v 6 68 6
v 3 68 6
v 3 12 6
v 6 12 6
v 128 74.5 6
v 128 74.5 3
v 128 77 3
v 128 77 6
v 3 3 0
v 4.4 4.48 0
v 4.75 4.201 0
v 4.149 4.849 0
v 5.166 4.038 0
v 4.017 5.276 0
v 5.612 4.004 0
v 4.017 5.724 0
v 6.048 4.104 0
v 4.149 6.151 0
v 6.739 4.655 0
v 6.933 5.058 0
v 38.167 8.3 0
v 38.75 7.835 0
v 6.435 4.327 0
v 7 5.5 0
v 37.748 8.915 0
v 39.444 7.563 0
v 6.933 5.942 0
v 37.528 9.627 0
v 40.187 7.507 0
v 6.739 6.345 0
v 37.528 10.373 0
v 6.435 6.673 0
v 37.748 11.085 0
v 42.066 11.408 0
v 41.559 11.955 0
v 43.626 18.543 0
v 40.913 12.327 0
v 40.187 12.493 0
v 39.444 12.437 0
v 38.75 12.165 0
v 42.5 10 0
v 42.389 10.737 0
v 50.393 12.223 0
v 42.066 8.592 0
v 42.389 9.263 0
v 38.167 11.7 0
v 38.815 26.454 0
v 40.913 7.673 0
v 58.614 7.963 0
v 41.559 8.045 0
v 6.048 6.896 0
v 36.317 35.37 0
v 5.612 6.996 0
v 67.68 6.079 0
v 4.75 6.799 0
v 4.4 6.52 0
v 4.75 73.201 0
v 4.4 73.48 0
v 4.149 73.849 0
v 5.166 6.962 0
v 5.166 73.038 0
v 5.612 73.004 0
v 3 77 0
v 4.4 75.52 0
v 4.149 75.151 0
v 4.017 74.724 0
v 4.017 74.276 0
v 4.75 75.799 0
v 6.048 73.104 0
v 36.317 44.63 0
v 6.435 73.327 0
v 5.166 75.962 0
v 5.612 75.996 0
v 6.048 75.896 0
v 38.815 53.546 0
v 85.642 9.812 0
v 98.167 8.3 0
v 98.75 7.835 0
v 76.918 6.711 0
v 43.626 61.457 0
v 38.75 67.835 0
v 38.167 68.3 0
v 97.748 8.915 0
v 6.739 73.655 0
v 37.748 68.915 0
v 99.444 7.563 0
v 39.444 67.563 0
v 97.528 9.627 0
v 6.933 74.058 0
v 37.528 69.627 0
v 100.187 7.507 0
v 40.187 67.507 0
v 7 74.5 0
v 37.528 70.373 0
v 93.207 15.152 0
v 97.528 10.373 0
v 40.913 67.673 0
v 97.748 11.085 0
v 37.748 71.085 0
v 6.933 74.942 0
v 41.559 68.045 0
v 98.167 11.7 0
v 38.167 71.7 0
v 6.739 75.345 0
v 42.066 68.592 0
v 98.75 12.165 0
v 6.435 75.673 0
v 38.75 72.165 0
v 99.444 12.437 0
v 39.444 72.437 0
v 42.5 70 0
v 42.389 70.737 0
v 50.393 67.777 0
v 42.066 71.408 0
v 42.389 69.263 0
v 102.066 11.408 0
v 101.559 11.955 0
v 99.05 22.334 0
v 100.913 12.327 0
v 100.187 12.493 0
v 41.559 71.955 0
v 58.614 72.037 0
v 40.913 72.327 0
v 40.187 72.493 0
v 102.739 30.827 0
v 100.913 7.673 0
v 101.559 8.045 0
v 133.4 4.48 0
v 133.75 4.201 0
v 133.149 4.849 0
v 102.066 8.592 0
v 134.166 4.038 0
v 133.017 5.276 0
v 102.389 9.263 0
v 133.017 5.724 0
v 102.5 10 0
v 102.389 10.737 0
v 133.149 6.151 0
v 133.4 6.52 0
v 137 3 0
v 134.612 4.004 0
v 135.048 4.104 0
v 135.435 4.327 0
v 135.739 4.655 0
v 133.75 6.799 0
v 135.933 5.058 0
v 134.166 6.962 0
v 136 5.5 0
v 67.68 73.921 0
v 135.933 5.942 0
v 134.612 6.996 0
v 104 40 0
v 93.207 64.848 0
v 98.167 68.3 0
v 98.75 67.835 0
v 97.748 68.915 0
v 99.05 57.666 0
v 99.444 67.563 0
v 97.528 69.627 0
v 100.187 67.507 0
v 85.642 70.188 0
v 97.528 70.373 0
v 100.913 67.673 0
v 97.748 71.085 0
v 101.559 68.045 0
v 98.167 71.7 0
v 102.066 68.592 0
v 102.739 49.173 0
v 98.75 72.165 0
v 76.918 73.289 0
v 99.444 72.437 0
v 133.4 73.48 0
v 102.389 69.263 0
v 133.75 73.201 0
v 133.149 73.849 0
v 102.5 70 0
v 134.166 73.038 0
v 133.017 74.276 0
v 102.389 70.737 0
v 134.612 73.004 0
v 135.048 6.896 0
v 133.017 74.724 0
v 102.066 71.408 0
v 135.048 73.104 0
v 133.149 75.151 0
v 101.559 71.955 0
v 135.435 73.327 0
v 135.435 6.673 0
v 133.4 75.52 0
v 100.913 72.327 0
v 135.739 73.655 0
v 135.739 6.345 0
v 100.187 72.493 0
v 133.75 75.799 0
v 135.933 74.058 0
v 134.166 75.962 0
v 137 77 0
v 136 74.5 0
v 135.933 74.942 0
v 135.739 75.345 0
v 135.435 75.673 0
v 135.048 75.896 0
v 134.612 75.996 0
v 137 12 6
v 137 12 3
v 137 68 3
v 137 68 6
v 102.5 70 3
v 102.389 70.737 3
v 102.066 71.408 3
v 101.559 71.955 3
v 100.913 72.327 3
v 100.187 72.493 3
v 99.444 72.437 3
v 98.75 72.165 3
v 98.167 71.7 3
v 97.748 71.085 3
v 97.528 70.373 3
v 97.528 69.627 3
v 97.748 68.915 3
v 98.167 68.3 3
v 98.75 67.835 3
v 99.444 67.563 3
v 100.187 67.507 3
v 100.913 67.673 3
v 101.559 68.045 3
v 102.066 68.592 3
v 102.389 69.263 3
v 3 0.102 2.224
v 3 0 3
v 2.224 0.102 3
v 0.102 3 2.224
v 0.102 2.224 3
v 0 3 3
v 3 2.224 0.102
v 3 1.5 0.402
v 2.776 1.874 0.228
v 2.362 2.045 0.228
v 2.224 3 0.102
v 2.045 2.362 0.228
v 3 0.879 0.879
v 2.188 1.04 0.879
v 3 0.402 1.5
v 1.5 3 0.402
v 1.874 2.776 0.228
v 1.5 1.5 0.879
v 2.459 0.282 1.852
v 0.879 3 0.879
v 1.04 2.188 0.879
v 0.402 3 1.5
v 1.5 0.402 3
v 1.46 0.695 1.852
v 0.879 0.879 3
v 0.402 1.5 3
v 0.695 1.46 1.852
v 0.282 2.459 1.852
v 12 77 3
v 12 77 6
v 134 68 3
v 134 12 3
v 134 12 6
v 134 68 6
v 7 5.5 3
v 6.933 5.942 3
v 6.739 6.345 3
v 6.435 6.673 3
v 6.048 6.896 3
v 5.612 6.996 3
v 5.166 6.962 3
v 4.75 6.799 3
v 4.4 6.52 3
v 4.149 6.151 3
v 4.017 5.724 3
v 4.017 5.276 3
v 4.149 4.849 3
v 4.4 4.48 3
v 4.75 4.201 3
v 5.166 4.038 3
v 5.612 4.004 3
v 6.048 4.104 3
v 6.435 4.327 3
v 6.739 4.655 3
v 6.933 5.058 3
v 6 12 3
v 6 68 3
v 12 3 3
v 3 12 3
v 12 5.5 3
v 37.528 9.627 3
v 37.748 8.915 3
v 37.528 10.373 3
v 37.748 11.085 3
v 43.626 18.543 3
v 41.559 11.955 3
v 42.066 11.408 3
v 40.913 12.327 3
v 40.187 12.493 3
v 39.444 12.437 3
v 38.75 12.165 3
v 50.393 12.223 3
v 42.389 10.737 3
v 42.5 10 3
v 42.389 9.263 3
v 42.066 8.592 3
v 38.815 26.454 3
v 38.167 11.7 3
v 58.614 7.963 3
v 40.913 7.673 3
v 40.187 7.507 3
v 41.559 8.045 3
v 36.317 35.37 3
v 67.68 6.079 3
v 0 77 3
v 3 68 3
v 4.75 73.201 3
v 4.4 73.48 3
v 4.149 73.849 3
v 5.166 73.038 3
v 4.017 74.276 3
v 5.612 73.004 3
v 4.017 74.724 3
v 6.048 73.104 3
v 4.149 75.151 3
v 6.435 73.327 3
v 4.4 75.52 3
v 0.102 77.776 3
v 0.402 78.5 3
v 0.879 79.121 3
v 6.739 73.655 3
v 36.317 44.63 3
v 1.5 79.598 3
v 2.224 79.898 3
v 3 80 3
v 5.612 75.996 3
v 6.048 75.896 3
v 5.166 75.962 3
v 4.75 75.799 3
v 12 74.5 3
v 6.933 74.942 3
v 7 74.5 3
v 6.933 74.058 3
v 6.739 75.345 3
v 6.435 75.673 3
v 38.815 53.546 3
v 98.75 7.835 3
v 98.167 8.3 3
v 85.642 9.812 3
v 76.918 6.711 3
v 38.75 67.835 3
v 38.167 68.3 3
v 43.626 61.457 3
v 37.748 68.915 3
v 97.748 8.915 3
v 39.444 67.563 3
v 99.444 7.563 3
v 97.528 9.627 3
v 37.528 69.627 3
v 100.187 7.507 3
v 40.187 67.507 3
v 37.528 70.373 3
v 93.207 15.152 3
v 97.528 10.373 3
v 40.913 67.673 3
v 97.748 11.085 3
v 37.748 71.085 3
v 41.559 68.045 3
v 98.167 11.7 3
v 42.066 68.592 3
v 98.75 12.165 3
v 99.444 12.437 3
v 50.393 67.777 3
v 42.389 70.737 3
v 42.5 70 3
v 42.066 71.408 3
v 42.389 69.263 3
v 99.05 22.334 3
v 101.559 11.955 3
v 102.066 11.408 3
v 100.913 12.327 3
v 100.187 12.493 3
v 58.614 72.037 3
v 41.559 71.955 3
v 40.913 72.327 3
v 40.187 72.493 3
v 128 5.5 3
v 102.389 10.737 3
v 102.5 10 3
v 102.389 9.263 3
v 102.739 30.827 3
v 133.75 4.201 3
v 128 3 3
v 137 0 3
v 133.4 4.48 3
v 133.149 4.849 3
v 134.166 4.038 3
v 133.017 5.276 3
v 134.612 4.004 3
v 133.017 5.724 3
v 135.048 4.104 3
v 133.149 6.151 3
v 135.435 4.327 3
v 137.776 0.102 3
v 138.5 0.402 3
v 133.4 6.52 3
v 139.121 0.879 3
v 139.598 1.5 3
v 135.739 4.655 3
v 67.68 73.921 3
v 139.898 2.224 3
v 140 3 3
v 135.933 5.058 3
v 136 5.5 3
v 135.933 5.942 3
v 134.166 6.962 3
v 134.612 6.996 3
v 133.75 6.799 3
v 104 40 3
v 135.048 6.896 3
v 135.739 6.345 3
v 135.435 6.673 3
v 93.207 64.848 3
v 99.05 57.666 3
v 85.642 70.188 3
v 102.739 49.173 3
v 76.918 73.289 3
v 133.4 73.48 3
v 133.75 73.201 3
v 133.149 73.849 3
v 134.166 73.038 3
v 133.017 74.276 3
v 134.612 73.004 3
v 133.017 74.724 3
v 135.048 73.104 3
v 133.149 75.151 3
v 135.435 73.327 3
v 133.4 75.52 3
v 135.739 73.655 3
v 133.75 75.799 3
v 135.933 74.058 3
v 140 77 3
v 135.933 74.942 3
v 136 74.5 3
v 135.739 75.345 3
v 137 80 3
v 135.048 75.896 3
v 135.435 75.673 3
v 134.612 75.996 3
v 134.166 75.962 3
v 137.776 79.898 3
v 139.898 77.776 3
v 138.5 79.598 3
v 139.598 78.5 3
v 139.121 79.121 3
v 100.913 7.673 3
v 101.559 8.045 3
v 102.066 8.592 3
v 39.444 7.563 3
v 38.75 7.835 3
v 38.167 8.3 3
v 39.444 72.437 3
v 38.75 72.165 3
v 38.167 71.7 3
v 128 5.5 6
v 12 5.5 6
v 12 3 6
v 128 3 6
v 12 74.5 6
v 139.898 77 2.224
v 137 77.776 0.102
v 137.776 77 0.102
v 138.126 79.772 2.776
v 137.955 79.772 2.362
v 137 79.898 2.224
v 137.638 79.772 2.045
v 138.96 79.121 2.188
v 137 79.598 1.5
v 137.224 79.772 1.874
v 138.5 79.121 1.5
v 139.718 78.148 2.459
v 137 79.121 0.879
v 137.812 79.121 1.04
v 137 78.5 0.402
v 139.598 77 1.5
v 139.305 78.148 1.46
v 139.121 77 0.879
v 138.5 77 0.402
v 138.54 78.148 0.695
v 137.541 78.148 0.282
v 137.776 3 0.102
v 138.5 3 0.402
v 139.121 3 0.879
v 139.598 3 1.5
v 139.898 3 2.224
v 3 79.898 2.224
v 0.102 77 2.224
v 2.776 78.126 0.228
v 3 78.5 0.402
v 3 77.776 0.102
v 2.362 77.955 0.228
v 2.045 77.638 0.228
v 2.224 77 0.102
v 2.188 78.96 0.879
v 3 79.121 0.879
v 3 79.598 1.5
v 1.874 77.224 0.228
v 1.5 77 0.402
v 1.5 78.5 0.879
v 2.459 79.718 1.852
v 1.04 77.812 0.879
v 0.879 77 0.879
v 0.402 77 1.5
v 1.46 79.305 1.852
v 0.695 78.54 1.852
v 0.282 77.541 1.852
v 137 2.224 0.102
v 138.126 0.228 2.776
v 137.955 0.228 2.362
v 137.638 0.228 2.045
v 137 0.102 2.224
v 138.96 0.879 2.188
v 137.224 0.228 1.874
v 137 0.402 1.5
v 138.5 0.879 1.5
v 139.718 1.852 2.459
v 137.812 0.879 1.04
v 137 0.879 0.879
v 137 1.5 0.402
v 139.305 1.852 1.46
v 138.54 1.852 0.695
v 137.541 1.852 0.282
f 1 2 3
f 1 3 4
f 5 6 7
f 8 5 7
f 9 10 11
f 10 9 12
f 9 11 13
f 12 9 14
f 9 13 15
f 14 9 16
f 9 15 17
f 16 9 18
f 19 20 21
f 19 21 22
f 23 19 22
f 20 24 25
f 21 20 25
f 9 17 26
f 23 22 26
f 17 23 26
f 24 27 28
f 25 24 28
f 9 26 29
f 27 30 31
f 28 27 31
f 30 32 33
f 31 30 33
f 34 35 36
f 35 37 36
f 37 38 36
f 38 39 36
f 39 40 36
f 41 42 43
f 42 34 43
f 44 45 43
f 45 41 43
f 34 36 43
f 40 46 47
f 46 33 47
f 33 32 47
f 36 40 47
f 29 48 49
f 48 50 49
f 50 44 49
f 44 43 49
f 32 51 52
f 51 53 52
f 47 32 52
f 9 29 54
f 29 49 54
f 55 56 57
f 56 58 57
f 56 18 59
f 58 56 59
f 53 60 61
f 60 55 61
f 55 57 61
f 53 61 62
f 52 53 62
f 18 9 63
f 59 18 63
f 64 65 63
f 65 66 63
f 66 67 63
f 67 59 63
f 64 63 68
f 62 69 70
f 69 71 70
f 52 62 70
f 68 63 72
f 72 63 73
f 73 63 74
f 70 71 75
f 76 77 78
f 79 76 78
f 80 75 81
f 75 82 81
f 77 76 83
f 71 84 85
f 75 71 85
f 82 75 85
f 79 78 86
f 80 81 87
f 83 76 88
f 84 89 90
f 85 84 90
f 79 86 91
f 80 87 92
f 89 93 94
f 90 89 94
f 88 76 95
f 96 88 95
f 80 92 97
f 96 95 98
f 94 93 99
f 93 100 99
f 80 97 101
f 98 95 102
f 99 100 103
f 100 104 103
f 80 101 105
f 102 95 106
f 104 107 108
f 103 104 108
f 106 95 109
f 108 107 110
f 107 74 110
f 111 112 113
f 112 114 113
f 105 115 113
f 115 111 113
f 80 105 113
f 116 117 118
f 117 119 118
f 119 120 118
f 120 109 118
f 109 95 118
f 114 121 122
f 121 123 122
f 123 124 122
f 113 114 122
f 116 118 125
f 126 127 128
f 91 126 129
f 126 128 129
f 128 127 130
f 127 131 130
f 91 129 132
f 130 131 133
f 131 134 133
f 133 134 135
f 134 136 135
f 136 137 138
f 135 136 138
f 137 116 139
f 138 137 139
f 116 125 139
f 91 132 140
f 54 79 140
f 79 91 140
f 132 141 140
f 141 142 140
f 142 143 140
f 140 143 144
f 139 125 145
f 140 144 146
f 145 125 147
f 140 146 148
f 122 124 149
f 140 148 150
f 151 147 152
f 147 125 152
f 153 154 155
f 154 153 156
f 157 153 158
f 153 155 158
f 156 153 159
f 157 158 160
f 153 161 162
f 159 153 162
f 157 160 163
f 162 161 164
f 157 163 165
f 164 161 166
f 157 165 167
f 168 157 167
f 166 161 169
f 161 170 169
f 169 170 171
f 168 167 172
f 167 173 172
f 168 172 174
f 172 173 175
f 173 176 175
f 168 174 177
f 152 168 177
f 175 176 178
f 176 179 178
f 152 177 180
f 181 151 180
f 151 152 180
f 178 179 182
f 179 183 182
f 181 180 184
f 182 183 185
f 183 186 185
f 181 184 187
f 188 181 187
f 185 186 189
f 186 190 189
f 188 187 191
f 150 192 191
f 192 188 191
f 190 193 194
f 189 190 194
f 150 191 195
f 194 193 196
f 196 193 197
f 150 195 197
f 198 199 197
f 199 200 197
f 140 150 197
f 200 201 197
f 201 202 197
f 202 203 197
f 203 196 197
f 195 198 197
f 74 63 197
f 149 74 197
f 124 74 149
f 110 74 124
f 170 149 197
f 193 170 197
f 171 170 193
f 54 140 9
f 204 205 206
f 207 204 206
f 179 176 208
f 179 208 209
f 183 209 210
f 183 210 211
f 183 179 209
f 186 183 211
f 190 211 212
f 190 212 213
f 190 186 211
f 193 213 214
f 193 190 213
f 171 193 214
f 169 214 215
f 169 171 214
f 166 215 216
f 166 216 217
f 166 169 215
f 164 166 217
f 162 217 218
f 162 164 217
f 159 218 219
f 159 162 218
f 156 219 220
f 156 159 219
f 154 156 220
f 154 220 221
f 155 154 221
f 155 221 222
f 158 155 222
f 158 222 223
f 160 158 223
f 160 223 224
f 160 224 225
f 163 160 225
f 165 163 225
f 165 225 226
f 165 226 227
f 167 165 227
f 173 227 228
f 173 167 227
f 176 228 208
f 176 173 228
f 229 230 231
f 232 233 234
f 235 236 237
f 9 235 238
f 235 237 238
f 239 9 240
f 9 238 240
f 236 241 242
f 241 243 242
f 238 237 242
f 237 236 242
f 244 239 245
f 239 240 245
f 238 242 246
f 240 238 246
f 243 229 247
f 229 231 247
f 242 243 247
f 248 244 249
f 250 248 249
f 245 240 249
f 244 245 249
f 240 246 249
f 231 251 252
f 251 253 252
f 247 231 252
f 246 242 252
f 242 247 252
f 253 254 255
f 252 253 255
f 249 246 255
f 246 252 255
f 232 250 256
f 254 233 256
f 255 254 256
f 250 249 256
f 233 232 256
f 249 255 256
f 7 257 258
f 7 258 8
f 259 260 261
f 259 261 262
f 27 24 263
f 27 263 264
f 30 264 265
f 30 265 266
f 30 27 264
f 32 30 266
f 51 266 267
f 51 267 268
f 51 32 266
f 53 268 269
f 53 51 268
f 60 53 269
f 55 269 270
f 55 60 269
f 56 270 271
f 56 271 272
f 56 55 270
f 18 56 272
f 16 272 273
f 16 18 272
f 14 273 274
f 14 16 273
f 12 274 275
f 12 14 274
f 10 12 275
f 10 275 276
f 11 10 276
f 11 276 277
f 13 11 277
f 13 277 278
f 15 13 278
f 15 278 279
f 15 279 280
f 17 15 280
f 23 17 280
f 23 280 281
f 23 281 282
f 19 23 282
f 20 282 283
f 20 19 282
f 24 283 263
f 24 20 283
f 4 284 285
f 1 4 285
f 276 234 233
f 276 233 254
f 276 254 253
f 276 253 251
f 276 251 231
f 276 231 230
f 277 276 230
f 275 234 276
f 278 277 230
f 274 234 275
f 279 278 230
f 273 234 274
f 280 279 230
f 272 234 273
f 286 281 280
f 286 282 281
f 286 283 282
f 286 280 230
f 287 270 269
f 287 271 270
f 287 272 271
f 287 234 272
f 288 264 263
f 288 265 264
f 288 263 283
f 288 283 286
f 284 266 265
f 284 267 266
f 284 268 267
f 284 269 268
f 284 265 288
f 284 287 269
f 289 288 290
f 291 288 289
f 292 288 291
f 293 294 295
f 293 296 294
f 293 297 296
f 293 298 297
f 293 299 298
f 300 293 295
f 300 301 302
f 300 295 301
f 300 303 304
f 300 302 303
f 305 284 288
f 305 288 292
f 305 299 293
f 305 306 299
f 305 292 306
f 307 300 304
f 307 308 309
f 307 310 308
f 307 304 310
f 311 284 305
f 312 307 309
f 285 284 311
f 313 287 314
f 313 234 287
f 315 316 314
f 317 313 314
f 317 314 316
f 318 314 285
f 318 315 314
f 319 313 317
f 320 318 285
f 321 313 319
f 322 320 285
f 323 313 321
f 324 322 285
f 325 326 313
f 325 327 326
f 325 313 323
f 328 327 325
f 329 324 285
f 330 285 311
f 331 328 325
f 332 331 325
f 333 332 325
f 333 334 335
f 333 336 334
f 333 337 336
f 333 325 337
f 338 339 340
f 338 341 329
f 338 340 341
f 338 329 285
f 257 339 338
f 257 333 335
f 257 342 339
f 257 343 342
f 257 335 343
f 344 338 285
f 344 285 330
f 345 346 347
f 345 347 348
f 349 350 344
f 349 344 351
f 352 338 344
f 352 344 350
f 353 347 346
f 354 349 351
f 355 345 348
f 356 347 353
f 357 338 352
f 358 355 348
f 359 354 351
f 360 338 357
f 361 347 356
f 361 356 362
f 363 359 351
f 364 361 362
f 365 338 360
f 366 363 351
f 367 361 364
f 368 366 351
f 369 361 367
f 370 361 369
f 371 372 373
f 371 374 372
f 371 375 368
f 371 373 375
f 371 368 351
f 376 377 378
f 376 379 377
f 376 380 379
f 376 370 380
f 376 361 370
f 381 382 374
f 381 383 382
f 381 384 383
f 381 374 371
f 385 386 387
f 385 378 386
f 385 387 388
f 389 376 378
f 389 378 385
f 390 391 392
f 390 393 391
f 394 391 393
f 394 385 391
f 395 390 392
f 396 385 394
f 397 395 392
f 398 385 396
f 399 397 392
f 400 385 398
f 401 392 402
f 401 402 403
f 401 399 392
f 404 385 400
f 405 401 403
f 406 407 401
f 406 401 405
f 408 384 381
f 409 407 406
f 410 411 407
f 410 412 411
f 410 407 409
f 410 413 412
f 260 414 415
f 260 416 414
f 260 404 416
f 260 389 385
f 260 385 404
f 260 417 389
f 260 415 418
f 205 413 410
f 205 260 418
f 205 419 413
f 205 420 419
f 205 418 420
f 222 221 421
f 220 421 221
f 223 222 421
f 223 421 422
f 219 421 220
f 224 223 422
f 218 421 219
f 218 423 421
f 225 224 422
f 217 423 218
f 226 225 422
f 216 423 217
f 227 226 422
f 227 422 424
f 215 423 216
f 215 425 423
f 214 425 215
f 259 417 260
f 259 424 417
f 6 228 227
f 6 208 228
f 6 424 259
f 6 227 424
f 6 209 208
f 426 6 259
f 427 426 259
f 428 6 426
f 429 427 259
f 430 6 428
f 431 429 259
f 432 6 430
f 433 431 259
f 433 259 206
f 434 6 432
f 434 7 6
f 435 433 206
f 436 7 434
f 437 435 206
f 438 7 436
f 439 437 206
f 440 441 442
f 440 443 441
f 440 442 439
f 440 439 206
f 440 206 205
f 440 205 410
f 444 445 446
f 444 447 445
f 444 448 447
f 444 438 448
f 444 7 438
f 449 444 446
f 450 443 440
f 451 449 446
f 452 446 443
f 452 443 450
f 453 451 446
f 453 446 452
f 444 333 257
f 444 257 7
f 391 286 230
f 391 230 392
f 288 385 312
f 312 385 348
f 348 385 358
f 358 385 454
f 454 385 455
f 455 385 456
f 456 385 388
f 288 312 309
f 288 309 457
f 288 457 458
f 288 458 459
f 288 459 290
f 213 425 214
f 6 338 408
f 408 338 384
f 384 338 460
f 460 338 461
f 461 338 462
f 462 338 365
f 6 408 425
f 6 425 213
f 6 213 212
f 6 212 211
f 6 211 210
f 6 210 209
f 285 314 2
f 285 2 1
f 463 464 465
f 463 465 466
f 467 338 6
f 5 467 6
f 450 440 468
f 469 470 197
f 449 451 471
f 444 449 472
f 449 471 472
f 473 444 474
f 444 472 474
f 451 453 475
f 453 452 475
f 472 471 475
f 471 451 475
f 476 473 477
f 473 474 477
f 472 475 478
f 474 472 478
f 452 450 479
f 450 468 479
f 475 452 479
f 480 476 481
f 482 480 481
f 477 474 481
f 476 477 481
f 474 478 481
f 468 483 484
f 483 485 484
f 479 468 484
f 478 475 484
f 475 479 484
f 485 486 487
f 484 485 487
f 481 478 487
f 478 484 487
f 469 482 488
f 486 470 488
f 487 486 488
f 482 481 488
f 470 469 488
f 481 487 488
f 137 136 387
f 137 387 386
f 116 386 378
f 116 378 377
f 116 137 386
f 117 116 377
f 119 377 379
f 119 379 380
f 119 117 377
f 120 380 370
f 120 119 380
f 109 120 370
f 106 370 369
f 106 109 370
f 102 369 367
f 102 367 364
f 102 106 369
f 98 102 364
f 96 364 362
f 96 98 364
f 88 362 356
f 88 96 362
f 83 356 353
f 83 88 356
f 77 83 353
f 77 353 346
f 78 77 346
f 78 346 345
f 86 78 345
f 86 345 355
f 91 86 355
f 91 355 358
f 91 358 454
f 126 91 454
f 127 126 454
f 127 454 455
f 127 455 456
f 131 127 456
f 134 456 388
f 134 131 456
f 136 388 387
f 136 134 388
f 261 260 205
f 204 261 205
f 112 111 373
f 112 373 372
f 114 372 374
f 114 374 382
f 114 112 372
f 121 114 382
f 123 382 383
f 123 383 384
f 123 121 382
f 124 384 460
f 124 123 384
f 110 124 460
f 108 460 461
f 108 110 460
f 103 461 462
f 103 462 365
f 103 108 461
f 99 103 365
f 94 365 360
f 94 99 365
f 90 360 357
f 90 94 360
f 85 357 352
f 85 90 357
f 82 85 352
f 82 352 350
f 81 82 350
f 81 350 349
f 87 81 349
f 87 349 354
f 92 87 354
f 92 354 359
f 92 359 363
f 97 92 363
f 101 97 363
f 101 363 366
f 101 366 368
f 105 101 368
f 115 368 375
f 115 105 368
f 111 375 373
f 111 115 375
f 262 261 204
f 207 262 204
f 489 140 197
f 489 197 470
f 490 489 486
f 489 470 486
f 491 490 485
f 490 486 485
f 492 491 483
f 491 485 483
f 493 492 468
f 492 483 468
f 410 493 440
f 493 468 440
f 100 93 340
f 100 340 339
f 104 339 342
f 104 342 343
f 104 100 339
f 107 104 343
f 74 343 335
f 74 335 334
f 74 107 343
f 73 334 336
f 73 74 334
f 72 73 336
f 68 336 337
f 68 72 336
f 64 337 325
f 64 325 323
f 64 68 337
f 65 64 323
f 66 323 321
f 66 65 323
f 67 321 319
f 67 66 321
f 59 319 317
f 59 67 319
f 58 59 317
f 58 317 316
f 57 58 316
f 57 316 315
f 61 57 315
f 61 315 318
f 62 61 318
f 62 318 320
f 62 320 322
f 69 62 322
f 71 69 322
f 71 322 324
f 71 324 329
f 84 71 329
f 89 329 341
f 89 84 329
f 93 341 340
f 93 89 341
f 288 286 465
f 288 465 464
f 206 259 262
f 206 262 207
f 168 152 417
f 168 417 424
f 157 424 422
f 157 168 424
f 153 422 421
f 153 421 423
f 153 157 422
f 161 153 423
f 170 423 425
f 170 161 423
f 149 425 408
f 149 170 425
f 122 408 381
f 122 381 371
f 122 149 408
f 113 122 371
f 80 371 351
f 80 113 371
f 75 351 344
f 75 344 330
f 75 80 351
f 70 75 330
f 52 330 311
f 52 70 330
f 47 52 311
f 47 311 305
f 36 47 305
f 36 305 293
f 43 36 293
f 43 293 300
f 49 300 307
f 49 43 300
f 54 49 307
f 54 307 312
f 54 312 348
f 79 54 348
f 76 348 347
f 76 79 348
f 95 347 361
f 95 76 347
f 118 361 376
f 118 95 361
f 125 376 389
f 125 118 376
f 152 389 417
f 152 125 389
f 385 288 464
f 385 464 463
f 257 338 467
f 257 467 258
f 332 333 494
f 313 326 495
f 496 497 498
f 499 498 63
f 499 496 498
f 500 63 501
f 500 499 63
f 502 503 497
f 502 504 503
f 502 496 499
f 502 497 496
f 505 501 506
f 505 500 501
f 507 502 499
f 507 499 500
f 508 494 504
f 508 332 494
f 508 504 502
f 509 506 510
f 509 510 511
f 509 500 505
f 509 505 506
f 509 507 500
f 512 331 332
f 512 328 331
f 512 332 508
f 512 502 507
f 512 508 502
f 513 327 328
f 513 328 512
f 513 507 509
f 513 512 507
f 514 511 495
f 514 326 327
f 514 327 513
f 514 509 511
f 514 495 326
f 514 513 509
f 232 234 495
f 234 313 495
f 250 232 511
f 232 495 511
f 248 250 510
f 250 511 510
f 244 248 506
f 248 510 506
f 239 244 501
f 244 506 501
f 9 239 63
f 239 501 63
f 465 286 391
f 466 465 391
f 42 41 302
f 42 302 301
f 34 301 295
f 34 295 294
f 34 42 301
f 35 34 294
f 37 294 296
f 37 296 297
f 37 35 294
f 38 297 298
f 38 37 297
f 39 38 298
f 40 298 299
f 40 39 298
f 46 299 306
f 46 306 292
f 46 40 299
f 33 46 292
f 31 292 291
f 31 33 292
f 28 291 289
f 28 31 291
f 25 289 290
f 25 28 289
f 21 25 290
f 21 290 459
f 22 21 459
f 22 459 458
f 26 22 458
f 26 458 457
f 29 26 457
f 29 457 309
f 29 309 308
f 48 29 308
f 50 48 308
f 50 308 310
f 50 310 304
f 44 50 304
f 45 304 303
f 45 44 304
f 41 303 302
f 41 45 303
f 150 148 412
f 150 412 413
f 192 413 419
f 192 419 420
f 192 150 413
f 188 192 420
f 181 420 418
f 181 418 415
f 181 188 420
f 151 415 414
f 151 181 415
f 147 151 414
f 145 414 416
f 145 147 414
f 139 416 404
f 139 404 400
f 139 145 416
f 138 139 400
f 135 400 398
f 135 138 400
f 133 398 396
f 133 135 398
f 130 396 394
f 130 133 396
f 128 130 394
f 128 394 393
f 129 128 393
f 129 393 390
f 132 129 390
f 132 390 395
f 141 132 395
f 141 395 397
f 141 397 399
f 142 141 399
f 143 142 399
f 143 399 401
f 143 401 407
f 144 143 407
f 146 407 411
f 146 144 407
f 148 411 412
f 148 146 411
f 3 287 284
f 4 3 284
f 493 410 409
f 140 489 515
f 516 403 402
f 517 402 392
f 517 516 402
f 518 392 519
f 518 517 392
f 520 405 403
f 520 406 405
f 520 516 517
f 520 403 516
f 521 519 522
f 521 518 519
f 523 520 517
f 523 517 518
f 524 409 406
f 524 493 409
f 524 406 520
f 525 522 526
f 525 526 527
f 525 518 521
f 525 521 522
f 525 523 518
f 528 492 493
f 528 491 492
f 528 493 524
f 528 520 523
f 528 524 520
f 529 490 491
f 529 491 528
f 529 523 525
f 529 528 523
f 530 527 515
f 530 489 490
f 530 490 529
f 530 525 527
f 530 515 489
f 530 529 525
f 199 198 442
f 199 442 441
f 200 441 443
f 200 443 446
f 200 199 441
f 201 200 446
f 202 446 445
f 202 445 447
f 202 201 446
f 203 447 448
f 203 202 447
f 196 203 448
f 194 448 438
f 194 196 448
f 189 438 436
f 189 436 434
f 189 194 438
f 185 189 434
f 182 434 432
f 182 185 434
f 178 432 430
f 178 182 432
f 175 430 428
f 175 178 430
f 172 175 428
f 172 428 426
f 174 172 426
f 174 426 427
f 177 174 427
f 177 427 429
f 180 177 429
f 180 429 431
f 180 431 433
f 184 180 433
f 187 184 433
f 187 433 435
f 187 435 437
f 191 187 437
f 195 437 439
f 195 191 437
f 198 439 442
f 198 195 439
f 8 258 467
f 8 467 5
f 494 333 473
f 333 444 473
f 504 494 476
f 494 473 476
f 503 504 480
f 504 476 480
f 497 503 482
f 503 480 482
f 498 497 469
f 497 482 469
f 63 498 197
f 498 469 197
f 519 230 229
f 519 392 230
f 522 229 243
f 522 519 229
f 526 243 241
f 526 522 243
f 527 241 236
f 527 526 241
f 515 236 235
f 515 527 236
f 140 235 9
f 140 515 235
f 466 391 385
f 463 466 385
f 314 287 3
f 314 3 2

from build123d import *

# Parameters (mm, degrees)
F0_W     = 116
F0_H     = 2.5
F1_DEPTH = 6
F0_W_2   = 3
F0_H_2   = 56
F0_W_3   = 140
F0_H_3   = 80
F0_R     = 1.5
F0_R_2   = 2.5
F0_R_3   = 34
F2_DEPTH = 3
F3_R     = 2.99999


# Not quite as in the source:
# - a fillet or chamfer is up to 0.001 mm smaller than in the source, because OpenCascade refuses the exact size


with BuildPart() as f1:
    # F0 (on Top) → F1 (new body)
    with BuildSketch(Plane.XY):
        with Locations((70, 75.75)):
            Rectangle(F0_W, F0_H)
    extrude(amount=F1_DEPTH)



with BuildPart() as f1b:
    # F0 (on Top) → F1, piece 2 (new body)
    with BuildSketch(Plane.XY):
        with Locations((70, 4.25)):
            Rectangle(F0_W, F0_H)
    extrude(amount=F1_DEPTH)


with BuildPart() as f1c:
    # F0 (on Top) → F1, piece 3 (new body)
    with BuildSketch(Plane.XY):
        with Locations((4.5, 40)):
            Rectangle(F0_W_2, F0_H_2)
    extrude(amount=F1_DEPTH)


with BuildPart() as f1d:
    # F0 (on Top) → F1, piece 4 (new body)
    with BuildSketch(Plane.XY):
        with Locations((135.5, 40)):
            Rectangle(F0_W_2, F0_H_2)
    extrude(amount=F1_DEPTH)


with BuildPart() as f1_1:
    add(f1.part)

    add(f1b.part)  # F2 merges F1b

    add(f1c.part)  # F2 merges F1c

    add(f1d.part)  # F2 merges F1d
    # F0 (on Top) → F2 (join)
    with BuildSketch(Plane.XY):
        with Locations((70, 40)):
            Rectangle(F0_W_3, F0_H_3)
        with Locations((5.5, 5.5)):
            Circle(F0_R, mode=Mode.SUBTRACT)
        with Locations((40, 10)):
            Circle(F0_R_2, mode=Mode.SUBTRACT)
        with Locations((70, 4.25)):
            Rectangle(F0_W, F0_H, mode=Mode.SUBTRACT)
        with Locations((100, 10)):
            Circle(F0_R_2, mode=Mode.SUBTRACT)
        with Locations((134.5, 5.5)):
            Circle(F0_R, mode=Mode.SUBTRACT)
        with Locations((4.5, 40)):
            Rectangle(F0_W_2, F0_H_2, mode=Mode.SUBTRACT)
        with Locations((5.5, 74.5)):
            Circle(F0_R, mode=Mode.SUBTRACT)
        with Locations((40, 70)):
            Circle(F0_R_2, mode=Mode.SUBTRACT)
        with Locations((70, 40)):
            Circle(F0_R_3, mode=Mode.SUBTRACT)
        with Locations((135.5, 40)):
            Rectangle(F0_W_2, F0_H_2, mode=Mode.SUBTRACT)
        with Locations((70, 75.75)):
            Rectangle(F0_W, F0_H, mode=Mode.SUBTRACT)
        with Locations((100, 70)):
            Circle(F0_R_2, mode=Mode.SUBTRACT)
        with Locations((134.5, 74.5)):
            Circle(F0_R, mode=Mode.SUBTRACT)
    extrude(amount=F2_DEPTH)

    # F3 (radius 3 in the source; OpenCascade refuses exactly that, so slightly less here)
    f3_edges = [f1_1.edges().sort_by_distance(p)[0] for p in [
        (140, 40, 0),
        (140, 80, 1.5),
        (0, 0, 1.5),
        (0, 80, 1.5),
        (140, 0, 1.5),
        (70, 0, 0),
        (70, 80, 0),
        (0, 40, 0),
    ]]
    fillet(f3_edges, radius=F3_R)


solid = f1_1.part
